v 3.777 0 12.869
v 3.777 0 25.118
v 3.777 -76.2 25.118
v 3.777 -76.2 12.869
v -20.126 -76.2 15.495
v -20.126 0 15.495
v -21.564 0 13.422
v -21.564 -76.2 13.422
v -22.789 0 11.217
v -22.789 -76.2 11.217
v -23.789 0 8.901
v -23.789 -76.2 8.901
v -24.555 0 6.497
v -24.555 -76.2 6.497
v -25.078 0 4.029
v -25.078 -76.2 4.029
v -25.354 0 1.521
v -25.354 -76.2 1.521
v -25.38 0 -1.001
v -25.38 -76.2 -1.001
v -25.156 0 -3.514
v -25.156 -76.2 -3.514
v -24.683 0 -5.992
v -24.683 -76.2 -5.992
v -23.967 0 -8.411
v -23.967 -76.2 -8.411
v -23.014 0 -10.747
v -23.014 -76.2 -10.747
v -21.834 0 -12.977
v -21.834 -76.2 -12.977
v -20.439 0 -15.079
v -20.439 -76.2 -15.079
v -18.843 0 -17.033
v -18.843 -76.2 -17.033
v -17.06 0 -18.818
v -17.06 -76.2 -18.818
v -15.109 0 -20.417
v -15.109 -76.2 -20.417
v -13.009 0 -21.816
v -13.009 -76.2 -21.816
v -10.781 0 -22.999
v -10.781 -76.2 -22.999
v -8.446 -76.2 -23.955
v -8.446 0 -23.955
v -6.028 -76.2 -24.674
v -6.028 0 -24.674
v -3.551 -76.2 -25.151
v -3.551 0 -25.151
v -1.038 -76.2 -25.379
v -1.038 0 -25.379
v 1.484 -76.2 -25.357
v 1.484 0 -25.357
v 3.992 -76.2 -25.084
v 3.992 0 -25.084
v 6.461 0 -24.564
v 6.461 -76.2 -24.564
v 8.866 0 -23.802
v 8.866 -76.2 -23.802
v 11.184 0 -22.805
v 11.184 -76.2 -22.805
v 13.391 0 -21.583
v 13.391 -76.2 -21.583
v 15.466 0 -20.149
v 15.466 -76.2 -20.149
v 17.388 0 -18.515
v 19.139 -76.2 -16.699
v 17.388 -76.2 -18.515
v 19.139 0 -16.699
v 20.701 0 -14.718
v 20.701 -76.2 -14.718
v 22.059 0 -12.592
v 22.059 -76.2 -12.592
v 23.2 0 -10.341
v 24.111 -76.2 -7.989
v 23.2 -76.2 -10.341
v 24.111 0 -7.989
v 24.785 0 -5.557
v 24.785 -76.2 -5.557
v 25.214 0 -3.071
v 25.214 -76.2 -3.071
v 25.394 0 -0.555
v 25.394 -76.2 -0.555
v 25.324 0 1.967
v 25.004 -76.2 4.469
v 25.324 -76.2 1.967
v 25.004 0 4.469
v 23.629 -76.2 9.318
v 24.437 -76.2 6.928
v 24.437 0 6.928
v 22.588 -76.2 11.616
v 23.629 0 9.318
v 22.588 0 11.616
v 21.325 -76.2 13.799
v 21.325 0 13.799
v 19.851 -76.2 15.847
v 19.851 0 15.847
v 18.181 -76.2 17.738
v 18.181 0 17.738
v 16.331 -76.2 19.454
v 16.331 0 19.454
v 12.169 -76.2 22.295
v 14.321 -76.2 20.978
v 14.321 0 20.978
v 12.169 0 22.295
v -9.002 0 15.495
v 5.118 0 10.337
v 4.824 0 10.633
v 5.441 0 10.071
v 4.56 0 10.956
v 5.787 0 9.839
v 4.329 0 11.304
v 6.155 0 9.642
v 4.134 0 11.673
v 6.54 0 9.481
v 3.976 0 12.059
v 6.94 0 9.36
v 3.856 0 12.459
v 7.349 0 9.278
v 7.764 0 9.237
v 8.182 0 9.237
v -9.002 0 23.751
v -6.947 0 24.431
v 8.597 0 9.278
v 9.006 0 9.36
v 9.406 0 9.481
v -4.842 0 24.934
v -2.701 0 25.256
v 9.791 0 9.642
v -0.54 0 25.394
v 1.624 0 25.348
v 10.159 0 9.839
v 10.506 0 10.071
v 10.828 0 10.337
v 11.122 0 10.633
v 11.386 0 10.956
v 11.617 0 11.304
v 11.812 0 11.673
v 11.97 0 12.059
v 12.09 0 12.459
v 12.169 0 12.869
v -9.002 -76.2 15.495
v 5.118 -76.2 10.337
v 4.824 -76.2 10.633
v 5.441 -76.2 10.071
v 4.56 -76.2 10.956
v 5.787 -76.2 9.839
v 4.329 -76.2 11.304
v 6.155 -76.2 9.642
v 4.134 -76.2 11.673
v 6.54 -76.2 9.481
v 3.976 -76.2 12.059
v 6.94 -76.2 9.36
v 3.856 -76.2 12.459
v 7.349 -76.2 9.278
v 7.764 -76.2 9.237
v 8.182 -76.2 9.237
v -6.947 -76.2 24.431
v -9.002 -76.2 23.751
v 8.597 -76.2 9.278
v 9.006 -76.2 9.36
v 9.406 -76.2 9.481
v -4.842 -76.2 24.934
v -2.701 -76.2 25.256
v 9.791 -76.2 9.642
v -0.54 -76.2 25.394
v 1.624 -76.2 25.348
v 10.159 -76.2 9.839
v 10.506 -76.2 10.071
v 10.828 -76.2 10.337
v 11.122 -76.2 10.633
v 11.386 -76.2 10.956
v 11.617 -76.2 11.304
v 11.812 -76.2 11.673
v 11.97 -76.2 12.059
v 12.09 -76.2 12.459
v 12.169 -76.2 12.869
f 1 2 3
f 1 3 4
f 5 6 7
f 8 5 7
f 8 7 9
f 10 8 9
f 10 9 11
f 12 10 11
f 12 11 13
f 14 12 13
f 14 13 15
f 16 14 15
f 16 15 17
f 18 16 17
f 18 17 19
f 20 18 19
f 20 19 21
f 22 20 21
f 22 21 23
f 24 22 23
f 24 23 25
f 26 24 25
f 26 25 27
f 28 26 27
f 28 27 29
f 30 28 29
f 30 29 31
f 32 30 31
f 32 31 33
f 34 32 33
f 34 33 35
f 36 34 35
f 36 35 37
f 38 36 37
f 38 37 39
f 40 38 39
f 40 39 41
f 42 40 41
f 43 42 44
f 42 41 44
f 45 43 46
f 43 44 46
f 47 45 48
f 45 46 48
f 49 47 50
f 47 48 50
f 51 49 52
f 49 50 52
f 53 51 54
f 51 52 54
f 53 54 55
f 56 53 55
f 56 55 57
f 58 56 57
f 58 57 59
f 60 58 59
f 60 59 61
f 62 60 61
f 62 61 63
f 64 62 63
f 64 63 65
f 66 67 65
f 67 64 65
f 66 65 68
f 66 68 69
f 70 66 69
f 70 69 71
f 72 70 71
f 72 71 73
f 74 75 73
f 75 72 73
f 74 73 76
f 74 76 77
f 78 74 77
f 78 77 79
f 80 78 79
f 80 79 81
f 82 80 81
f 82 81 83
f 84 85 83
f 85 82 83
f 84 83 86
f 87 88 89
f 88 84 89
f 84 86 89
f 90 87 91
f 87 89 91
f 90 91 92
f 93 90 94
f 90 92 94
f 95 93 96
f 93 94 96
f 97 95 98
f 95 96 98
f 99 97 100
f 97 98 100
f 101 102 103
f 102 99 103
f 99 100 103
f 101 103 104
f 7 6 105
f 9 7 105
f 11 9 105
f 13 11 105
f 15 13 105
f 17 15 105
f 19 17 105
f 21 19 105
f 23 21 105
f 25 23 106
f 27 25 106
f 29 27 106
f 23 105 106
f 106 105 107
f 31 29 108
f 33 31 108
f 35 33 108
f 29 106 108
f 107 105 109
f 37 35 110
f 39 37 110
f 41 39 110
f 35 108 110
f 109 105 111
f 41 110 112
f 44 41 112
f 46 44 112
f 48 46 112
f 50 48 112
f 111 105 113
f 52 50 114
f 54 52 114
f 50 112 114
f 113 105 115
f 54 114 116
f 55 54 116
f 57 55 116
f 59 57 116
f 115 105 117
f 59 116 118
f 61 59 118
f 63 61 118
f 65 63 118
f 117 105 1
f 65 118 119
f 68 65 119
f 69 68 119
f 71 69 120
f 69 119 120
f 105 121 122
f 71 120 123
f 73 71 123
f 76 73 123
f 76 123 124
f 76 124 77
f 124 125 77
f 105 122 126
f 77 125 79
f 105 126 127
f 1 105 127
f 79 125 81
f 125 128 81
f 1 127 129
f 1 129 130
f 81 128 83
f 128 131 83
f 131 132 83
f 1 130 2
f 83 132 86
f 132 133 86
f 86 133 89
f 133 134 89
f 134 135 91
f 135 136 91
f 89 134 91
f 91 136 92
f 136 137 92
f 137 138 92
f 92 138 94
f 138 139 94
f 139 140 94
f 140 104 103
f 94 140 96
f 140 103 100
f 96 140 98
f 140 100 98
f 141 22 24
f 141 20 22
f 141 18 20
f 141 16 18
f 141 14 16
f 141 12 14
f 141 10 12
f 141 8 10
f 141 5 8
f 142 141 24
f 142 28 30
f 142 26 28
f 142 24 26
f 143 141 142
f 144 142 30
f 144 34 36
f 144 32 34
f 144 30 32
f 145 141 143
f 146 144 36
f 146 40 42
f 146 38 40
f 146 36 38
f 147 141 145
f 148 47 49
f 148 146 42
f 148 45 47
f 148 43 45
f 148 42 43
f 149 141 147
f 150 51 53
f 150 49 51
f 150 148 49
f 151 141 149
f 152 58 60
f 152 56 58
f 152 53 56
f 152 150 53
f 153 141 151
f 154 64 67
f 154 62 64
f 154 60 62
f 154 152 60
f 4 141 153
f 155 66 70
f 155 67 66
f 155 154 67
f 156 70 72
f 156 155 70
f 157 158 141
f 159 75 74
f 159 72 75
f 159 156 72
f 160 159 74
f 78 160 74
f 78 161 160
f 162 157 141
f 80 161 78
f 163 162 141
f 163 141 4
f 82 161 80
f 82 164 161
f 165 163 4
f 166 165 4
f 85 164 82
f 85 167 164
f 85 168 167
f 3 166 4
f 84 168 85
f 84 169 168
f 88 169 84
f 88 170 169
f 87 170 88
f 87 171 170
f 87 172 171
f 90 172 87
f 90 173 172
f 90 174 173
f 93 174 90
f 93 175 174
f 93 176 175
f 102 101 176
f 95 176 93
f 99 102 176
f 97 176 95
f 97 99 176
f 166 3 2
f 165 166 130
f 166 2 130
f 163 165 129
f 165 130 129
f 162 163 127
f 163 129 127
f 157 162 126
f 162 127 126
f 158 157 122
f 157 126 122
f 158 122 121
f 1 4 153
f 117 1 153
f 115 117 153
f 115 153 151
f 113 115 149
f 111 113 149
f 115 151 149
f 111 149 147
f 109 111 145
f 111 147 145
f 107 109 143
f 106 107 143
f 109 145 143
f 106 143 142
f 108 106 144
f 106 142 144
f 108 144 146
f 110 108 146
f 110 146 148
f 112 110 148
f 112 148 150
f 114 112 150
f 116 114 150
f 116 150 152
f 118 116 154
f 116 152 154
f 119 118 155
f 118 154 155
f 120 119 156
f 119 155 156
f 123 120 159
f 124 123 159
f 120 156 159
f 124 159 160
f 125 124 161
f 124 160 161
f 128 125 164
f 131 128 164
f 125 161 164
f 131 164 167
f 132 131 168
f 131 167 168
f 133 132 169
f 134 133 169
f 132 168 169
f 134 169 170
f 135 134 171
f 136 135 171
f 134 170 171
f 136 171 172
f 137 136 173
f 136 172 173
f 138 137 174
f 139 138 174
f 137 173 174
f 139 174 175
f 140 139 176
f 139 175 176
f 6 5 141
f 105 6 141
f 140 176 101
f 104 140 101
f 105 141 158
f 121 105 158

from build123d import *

# Parameters (mm, degrees)
F0_R     = 25.4
F1_DEPTH = 76.2
F2_W     = 20.5636313185
F2_H     = 12.2810583562
F3_DEPTH = 76.2
F5_DEPTH = 76.2


with BuildPart() as f1:
    # F0 (on Front) → F1 (new body)
    with BuildSketch(Plane.XZ):
        Circle(F0_R)
    extrude(amount=F1_DEPTH)

    # F2 (on face) → F3 (cut)
    with BuildSketch(Plane.XZ.offset(76.2)):
        with Locations((-19.2842693068, 21.6356487945)):
            Rectangle(F2_W, F2_H)
    extrude(amount=-F3_DEPTH, mode=Mode.SUBTRACT)

    # F4 (on face) → F5 (cut)
    with BuildSketch(Plane.XZ.offset(76.2)):
        with BuildLine():
            Line((12.1693527326, 12.8687405959), (3.7766969763, 12.8687405959))
            ThreePointArc((3.7766969763, 12.8687405959), (7.9730248544, 9.231923148), (12.1693527326, 12.8687405959))
        make_face()
        with BuildLine():
            Line((3.7766969763, 14.0738399925), (3.7766969763, 12.8687405959))
            Line((3.7766969763, 12.8687405959), (12.1693527326, 12.8687405959))
            Line((12.1693527326, 12.8687405959), (12.1693527326, 14.0738399925))
            ThreePointArc((12.1693527326, 14.0738399925), (7.9730248544, 17.7106574404), (3.7766969763, 14.0738399925))
        make_face()
        with BuildLine():
            Line((3.7766969763, 36.0884256661), (3.7766969763, 25.1176543481))
            ThreePointArc((3.7766969763, 25.1176543481), (8.096973208, 24.0748629252), (12.1693527326, 22.2949961666))
            Line((12.1693527326, 22.2949961666), (12.1693527326, 36.0884256661))
            Line((12.1693527326, 36.0884256661), (3.7766969763, 36.0884256661))
        make_face()
        with BuildLine():
            Line((3.7766969763, 25.1176543481), (3.7766969763, 14.0738399925))
            ThreePointArc((3.7766969763, 14.0738399925), (7.9730248544, 17.7106574404), (12.1693527326, 14.0738399925))
            Line((12.1693527326, 14.0738399925), (12.1693527326, 22.2949961666))
            ThreePointArc((12.1693527326, 22.2949961666), (8.096973208, 24.0748629252), (3.7766969763, 25.1176543481))
        make_face()
    extrude(amount=-F5_DEPTH, mode=Mode.SUBTRACT)


solid = f1.part
